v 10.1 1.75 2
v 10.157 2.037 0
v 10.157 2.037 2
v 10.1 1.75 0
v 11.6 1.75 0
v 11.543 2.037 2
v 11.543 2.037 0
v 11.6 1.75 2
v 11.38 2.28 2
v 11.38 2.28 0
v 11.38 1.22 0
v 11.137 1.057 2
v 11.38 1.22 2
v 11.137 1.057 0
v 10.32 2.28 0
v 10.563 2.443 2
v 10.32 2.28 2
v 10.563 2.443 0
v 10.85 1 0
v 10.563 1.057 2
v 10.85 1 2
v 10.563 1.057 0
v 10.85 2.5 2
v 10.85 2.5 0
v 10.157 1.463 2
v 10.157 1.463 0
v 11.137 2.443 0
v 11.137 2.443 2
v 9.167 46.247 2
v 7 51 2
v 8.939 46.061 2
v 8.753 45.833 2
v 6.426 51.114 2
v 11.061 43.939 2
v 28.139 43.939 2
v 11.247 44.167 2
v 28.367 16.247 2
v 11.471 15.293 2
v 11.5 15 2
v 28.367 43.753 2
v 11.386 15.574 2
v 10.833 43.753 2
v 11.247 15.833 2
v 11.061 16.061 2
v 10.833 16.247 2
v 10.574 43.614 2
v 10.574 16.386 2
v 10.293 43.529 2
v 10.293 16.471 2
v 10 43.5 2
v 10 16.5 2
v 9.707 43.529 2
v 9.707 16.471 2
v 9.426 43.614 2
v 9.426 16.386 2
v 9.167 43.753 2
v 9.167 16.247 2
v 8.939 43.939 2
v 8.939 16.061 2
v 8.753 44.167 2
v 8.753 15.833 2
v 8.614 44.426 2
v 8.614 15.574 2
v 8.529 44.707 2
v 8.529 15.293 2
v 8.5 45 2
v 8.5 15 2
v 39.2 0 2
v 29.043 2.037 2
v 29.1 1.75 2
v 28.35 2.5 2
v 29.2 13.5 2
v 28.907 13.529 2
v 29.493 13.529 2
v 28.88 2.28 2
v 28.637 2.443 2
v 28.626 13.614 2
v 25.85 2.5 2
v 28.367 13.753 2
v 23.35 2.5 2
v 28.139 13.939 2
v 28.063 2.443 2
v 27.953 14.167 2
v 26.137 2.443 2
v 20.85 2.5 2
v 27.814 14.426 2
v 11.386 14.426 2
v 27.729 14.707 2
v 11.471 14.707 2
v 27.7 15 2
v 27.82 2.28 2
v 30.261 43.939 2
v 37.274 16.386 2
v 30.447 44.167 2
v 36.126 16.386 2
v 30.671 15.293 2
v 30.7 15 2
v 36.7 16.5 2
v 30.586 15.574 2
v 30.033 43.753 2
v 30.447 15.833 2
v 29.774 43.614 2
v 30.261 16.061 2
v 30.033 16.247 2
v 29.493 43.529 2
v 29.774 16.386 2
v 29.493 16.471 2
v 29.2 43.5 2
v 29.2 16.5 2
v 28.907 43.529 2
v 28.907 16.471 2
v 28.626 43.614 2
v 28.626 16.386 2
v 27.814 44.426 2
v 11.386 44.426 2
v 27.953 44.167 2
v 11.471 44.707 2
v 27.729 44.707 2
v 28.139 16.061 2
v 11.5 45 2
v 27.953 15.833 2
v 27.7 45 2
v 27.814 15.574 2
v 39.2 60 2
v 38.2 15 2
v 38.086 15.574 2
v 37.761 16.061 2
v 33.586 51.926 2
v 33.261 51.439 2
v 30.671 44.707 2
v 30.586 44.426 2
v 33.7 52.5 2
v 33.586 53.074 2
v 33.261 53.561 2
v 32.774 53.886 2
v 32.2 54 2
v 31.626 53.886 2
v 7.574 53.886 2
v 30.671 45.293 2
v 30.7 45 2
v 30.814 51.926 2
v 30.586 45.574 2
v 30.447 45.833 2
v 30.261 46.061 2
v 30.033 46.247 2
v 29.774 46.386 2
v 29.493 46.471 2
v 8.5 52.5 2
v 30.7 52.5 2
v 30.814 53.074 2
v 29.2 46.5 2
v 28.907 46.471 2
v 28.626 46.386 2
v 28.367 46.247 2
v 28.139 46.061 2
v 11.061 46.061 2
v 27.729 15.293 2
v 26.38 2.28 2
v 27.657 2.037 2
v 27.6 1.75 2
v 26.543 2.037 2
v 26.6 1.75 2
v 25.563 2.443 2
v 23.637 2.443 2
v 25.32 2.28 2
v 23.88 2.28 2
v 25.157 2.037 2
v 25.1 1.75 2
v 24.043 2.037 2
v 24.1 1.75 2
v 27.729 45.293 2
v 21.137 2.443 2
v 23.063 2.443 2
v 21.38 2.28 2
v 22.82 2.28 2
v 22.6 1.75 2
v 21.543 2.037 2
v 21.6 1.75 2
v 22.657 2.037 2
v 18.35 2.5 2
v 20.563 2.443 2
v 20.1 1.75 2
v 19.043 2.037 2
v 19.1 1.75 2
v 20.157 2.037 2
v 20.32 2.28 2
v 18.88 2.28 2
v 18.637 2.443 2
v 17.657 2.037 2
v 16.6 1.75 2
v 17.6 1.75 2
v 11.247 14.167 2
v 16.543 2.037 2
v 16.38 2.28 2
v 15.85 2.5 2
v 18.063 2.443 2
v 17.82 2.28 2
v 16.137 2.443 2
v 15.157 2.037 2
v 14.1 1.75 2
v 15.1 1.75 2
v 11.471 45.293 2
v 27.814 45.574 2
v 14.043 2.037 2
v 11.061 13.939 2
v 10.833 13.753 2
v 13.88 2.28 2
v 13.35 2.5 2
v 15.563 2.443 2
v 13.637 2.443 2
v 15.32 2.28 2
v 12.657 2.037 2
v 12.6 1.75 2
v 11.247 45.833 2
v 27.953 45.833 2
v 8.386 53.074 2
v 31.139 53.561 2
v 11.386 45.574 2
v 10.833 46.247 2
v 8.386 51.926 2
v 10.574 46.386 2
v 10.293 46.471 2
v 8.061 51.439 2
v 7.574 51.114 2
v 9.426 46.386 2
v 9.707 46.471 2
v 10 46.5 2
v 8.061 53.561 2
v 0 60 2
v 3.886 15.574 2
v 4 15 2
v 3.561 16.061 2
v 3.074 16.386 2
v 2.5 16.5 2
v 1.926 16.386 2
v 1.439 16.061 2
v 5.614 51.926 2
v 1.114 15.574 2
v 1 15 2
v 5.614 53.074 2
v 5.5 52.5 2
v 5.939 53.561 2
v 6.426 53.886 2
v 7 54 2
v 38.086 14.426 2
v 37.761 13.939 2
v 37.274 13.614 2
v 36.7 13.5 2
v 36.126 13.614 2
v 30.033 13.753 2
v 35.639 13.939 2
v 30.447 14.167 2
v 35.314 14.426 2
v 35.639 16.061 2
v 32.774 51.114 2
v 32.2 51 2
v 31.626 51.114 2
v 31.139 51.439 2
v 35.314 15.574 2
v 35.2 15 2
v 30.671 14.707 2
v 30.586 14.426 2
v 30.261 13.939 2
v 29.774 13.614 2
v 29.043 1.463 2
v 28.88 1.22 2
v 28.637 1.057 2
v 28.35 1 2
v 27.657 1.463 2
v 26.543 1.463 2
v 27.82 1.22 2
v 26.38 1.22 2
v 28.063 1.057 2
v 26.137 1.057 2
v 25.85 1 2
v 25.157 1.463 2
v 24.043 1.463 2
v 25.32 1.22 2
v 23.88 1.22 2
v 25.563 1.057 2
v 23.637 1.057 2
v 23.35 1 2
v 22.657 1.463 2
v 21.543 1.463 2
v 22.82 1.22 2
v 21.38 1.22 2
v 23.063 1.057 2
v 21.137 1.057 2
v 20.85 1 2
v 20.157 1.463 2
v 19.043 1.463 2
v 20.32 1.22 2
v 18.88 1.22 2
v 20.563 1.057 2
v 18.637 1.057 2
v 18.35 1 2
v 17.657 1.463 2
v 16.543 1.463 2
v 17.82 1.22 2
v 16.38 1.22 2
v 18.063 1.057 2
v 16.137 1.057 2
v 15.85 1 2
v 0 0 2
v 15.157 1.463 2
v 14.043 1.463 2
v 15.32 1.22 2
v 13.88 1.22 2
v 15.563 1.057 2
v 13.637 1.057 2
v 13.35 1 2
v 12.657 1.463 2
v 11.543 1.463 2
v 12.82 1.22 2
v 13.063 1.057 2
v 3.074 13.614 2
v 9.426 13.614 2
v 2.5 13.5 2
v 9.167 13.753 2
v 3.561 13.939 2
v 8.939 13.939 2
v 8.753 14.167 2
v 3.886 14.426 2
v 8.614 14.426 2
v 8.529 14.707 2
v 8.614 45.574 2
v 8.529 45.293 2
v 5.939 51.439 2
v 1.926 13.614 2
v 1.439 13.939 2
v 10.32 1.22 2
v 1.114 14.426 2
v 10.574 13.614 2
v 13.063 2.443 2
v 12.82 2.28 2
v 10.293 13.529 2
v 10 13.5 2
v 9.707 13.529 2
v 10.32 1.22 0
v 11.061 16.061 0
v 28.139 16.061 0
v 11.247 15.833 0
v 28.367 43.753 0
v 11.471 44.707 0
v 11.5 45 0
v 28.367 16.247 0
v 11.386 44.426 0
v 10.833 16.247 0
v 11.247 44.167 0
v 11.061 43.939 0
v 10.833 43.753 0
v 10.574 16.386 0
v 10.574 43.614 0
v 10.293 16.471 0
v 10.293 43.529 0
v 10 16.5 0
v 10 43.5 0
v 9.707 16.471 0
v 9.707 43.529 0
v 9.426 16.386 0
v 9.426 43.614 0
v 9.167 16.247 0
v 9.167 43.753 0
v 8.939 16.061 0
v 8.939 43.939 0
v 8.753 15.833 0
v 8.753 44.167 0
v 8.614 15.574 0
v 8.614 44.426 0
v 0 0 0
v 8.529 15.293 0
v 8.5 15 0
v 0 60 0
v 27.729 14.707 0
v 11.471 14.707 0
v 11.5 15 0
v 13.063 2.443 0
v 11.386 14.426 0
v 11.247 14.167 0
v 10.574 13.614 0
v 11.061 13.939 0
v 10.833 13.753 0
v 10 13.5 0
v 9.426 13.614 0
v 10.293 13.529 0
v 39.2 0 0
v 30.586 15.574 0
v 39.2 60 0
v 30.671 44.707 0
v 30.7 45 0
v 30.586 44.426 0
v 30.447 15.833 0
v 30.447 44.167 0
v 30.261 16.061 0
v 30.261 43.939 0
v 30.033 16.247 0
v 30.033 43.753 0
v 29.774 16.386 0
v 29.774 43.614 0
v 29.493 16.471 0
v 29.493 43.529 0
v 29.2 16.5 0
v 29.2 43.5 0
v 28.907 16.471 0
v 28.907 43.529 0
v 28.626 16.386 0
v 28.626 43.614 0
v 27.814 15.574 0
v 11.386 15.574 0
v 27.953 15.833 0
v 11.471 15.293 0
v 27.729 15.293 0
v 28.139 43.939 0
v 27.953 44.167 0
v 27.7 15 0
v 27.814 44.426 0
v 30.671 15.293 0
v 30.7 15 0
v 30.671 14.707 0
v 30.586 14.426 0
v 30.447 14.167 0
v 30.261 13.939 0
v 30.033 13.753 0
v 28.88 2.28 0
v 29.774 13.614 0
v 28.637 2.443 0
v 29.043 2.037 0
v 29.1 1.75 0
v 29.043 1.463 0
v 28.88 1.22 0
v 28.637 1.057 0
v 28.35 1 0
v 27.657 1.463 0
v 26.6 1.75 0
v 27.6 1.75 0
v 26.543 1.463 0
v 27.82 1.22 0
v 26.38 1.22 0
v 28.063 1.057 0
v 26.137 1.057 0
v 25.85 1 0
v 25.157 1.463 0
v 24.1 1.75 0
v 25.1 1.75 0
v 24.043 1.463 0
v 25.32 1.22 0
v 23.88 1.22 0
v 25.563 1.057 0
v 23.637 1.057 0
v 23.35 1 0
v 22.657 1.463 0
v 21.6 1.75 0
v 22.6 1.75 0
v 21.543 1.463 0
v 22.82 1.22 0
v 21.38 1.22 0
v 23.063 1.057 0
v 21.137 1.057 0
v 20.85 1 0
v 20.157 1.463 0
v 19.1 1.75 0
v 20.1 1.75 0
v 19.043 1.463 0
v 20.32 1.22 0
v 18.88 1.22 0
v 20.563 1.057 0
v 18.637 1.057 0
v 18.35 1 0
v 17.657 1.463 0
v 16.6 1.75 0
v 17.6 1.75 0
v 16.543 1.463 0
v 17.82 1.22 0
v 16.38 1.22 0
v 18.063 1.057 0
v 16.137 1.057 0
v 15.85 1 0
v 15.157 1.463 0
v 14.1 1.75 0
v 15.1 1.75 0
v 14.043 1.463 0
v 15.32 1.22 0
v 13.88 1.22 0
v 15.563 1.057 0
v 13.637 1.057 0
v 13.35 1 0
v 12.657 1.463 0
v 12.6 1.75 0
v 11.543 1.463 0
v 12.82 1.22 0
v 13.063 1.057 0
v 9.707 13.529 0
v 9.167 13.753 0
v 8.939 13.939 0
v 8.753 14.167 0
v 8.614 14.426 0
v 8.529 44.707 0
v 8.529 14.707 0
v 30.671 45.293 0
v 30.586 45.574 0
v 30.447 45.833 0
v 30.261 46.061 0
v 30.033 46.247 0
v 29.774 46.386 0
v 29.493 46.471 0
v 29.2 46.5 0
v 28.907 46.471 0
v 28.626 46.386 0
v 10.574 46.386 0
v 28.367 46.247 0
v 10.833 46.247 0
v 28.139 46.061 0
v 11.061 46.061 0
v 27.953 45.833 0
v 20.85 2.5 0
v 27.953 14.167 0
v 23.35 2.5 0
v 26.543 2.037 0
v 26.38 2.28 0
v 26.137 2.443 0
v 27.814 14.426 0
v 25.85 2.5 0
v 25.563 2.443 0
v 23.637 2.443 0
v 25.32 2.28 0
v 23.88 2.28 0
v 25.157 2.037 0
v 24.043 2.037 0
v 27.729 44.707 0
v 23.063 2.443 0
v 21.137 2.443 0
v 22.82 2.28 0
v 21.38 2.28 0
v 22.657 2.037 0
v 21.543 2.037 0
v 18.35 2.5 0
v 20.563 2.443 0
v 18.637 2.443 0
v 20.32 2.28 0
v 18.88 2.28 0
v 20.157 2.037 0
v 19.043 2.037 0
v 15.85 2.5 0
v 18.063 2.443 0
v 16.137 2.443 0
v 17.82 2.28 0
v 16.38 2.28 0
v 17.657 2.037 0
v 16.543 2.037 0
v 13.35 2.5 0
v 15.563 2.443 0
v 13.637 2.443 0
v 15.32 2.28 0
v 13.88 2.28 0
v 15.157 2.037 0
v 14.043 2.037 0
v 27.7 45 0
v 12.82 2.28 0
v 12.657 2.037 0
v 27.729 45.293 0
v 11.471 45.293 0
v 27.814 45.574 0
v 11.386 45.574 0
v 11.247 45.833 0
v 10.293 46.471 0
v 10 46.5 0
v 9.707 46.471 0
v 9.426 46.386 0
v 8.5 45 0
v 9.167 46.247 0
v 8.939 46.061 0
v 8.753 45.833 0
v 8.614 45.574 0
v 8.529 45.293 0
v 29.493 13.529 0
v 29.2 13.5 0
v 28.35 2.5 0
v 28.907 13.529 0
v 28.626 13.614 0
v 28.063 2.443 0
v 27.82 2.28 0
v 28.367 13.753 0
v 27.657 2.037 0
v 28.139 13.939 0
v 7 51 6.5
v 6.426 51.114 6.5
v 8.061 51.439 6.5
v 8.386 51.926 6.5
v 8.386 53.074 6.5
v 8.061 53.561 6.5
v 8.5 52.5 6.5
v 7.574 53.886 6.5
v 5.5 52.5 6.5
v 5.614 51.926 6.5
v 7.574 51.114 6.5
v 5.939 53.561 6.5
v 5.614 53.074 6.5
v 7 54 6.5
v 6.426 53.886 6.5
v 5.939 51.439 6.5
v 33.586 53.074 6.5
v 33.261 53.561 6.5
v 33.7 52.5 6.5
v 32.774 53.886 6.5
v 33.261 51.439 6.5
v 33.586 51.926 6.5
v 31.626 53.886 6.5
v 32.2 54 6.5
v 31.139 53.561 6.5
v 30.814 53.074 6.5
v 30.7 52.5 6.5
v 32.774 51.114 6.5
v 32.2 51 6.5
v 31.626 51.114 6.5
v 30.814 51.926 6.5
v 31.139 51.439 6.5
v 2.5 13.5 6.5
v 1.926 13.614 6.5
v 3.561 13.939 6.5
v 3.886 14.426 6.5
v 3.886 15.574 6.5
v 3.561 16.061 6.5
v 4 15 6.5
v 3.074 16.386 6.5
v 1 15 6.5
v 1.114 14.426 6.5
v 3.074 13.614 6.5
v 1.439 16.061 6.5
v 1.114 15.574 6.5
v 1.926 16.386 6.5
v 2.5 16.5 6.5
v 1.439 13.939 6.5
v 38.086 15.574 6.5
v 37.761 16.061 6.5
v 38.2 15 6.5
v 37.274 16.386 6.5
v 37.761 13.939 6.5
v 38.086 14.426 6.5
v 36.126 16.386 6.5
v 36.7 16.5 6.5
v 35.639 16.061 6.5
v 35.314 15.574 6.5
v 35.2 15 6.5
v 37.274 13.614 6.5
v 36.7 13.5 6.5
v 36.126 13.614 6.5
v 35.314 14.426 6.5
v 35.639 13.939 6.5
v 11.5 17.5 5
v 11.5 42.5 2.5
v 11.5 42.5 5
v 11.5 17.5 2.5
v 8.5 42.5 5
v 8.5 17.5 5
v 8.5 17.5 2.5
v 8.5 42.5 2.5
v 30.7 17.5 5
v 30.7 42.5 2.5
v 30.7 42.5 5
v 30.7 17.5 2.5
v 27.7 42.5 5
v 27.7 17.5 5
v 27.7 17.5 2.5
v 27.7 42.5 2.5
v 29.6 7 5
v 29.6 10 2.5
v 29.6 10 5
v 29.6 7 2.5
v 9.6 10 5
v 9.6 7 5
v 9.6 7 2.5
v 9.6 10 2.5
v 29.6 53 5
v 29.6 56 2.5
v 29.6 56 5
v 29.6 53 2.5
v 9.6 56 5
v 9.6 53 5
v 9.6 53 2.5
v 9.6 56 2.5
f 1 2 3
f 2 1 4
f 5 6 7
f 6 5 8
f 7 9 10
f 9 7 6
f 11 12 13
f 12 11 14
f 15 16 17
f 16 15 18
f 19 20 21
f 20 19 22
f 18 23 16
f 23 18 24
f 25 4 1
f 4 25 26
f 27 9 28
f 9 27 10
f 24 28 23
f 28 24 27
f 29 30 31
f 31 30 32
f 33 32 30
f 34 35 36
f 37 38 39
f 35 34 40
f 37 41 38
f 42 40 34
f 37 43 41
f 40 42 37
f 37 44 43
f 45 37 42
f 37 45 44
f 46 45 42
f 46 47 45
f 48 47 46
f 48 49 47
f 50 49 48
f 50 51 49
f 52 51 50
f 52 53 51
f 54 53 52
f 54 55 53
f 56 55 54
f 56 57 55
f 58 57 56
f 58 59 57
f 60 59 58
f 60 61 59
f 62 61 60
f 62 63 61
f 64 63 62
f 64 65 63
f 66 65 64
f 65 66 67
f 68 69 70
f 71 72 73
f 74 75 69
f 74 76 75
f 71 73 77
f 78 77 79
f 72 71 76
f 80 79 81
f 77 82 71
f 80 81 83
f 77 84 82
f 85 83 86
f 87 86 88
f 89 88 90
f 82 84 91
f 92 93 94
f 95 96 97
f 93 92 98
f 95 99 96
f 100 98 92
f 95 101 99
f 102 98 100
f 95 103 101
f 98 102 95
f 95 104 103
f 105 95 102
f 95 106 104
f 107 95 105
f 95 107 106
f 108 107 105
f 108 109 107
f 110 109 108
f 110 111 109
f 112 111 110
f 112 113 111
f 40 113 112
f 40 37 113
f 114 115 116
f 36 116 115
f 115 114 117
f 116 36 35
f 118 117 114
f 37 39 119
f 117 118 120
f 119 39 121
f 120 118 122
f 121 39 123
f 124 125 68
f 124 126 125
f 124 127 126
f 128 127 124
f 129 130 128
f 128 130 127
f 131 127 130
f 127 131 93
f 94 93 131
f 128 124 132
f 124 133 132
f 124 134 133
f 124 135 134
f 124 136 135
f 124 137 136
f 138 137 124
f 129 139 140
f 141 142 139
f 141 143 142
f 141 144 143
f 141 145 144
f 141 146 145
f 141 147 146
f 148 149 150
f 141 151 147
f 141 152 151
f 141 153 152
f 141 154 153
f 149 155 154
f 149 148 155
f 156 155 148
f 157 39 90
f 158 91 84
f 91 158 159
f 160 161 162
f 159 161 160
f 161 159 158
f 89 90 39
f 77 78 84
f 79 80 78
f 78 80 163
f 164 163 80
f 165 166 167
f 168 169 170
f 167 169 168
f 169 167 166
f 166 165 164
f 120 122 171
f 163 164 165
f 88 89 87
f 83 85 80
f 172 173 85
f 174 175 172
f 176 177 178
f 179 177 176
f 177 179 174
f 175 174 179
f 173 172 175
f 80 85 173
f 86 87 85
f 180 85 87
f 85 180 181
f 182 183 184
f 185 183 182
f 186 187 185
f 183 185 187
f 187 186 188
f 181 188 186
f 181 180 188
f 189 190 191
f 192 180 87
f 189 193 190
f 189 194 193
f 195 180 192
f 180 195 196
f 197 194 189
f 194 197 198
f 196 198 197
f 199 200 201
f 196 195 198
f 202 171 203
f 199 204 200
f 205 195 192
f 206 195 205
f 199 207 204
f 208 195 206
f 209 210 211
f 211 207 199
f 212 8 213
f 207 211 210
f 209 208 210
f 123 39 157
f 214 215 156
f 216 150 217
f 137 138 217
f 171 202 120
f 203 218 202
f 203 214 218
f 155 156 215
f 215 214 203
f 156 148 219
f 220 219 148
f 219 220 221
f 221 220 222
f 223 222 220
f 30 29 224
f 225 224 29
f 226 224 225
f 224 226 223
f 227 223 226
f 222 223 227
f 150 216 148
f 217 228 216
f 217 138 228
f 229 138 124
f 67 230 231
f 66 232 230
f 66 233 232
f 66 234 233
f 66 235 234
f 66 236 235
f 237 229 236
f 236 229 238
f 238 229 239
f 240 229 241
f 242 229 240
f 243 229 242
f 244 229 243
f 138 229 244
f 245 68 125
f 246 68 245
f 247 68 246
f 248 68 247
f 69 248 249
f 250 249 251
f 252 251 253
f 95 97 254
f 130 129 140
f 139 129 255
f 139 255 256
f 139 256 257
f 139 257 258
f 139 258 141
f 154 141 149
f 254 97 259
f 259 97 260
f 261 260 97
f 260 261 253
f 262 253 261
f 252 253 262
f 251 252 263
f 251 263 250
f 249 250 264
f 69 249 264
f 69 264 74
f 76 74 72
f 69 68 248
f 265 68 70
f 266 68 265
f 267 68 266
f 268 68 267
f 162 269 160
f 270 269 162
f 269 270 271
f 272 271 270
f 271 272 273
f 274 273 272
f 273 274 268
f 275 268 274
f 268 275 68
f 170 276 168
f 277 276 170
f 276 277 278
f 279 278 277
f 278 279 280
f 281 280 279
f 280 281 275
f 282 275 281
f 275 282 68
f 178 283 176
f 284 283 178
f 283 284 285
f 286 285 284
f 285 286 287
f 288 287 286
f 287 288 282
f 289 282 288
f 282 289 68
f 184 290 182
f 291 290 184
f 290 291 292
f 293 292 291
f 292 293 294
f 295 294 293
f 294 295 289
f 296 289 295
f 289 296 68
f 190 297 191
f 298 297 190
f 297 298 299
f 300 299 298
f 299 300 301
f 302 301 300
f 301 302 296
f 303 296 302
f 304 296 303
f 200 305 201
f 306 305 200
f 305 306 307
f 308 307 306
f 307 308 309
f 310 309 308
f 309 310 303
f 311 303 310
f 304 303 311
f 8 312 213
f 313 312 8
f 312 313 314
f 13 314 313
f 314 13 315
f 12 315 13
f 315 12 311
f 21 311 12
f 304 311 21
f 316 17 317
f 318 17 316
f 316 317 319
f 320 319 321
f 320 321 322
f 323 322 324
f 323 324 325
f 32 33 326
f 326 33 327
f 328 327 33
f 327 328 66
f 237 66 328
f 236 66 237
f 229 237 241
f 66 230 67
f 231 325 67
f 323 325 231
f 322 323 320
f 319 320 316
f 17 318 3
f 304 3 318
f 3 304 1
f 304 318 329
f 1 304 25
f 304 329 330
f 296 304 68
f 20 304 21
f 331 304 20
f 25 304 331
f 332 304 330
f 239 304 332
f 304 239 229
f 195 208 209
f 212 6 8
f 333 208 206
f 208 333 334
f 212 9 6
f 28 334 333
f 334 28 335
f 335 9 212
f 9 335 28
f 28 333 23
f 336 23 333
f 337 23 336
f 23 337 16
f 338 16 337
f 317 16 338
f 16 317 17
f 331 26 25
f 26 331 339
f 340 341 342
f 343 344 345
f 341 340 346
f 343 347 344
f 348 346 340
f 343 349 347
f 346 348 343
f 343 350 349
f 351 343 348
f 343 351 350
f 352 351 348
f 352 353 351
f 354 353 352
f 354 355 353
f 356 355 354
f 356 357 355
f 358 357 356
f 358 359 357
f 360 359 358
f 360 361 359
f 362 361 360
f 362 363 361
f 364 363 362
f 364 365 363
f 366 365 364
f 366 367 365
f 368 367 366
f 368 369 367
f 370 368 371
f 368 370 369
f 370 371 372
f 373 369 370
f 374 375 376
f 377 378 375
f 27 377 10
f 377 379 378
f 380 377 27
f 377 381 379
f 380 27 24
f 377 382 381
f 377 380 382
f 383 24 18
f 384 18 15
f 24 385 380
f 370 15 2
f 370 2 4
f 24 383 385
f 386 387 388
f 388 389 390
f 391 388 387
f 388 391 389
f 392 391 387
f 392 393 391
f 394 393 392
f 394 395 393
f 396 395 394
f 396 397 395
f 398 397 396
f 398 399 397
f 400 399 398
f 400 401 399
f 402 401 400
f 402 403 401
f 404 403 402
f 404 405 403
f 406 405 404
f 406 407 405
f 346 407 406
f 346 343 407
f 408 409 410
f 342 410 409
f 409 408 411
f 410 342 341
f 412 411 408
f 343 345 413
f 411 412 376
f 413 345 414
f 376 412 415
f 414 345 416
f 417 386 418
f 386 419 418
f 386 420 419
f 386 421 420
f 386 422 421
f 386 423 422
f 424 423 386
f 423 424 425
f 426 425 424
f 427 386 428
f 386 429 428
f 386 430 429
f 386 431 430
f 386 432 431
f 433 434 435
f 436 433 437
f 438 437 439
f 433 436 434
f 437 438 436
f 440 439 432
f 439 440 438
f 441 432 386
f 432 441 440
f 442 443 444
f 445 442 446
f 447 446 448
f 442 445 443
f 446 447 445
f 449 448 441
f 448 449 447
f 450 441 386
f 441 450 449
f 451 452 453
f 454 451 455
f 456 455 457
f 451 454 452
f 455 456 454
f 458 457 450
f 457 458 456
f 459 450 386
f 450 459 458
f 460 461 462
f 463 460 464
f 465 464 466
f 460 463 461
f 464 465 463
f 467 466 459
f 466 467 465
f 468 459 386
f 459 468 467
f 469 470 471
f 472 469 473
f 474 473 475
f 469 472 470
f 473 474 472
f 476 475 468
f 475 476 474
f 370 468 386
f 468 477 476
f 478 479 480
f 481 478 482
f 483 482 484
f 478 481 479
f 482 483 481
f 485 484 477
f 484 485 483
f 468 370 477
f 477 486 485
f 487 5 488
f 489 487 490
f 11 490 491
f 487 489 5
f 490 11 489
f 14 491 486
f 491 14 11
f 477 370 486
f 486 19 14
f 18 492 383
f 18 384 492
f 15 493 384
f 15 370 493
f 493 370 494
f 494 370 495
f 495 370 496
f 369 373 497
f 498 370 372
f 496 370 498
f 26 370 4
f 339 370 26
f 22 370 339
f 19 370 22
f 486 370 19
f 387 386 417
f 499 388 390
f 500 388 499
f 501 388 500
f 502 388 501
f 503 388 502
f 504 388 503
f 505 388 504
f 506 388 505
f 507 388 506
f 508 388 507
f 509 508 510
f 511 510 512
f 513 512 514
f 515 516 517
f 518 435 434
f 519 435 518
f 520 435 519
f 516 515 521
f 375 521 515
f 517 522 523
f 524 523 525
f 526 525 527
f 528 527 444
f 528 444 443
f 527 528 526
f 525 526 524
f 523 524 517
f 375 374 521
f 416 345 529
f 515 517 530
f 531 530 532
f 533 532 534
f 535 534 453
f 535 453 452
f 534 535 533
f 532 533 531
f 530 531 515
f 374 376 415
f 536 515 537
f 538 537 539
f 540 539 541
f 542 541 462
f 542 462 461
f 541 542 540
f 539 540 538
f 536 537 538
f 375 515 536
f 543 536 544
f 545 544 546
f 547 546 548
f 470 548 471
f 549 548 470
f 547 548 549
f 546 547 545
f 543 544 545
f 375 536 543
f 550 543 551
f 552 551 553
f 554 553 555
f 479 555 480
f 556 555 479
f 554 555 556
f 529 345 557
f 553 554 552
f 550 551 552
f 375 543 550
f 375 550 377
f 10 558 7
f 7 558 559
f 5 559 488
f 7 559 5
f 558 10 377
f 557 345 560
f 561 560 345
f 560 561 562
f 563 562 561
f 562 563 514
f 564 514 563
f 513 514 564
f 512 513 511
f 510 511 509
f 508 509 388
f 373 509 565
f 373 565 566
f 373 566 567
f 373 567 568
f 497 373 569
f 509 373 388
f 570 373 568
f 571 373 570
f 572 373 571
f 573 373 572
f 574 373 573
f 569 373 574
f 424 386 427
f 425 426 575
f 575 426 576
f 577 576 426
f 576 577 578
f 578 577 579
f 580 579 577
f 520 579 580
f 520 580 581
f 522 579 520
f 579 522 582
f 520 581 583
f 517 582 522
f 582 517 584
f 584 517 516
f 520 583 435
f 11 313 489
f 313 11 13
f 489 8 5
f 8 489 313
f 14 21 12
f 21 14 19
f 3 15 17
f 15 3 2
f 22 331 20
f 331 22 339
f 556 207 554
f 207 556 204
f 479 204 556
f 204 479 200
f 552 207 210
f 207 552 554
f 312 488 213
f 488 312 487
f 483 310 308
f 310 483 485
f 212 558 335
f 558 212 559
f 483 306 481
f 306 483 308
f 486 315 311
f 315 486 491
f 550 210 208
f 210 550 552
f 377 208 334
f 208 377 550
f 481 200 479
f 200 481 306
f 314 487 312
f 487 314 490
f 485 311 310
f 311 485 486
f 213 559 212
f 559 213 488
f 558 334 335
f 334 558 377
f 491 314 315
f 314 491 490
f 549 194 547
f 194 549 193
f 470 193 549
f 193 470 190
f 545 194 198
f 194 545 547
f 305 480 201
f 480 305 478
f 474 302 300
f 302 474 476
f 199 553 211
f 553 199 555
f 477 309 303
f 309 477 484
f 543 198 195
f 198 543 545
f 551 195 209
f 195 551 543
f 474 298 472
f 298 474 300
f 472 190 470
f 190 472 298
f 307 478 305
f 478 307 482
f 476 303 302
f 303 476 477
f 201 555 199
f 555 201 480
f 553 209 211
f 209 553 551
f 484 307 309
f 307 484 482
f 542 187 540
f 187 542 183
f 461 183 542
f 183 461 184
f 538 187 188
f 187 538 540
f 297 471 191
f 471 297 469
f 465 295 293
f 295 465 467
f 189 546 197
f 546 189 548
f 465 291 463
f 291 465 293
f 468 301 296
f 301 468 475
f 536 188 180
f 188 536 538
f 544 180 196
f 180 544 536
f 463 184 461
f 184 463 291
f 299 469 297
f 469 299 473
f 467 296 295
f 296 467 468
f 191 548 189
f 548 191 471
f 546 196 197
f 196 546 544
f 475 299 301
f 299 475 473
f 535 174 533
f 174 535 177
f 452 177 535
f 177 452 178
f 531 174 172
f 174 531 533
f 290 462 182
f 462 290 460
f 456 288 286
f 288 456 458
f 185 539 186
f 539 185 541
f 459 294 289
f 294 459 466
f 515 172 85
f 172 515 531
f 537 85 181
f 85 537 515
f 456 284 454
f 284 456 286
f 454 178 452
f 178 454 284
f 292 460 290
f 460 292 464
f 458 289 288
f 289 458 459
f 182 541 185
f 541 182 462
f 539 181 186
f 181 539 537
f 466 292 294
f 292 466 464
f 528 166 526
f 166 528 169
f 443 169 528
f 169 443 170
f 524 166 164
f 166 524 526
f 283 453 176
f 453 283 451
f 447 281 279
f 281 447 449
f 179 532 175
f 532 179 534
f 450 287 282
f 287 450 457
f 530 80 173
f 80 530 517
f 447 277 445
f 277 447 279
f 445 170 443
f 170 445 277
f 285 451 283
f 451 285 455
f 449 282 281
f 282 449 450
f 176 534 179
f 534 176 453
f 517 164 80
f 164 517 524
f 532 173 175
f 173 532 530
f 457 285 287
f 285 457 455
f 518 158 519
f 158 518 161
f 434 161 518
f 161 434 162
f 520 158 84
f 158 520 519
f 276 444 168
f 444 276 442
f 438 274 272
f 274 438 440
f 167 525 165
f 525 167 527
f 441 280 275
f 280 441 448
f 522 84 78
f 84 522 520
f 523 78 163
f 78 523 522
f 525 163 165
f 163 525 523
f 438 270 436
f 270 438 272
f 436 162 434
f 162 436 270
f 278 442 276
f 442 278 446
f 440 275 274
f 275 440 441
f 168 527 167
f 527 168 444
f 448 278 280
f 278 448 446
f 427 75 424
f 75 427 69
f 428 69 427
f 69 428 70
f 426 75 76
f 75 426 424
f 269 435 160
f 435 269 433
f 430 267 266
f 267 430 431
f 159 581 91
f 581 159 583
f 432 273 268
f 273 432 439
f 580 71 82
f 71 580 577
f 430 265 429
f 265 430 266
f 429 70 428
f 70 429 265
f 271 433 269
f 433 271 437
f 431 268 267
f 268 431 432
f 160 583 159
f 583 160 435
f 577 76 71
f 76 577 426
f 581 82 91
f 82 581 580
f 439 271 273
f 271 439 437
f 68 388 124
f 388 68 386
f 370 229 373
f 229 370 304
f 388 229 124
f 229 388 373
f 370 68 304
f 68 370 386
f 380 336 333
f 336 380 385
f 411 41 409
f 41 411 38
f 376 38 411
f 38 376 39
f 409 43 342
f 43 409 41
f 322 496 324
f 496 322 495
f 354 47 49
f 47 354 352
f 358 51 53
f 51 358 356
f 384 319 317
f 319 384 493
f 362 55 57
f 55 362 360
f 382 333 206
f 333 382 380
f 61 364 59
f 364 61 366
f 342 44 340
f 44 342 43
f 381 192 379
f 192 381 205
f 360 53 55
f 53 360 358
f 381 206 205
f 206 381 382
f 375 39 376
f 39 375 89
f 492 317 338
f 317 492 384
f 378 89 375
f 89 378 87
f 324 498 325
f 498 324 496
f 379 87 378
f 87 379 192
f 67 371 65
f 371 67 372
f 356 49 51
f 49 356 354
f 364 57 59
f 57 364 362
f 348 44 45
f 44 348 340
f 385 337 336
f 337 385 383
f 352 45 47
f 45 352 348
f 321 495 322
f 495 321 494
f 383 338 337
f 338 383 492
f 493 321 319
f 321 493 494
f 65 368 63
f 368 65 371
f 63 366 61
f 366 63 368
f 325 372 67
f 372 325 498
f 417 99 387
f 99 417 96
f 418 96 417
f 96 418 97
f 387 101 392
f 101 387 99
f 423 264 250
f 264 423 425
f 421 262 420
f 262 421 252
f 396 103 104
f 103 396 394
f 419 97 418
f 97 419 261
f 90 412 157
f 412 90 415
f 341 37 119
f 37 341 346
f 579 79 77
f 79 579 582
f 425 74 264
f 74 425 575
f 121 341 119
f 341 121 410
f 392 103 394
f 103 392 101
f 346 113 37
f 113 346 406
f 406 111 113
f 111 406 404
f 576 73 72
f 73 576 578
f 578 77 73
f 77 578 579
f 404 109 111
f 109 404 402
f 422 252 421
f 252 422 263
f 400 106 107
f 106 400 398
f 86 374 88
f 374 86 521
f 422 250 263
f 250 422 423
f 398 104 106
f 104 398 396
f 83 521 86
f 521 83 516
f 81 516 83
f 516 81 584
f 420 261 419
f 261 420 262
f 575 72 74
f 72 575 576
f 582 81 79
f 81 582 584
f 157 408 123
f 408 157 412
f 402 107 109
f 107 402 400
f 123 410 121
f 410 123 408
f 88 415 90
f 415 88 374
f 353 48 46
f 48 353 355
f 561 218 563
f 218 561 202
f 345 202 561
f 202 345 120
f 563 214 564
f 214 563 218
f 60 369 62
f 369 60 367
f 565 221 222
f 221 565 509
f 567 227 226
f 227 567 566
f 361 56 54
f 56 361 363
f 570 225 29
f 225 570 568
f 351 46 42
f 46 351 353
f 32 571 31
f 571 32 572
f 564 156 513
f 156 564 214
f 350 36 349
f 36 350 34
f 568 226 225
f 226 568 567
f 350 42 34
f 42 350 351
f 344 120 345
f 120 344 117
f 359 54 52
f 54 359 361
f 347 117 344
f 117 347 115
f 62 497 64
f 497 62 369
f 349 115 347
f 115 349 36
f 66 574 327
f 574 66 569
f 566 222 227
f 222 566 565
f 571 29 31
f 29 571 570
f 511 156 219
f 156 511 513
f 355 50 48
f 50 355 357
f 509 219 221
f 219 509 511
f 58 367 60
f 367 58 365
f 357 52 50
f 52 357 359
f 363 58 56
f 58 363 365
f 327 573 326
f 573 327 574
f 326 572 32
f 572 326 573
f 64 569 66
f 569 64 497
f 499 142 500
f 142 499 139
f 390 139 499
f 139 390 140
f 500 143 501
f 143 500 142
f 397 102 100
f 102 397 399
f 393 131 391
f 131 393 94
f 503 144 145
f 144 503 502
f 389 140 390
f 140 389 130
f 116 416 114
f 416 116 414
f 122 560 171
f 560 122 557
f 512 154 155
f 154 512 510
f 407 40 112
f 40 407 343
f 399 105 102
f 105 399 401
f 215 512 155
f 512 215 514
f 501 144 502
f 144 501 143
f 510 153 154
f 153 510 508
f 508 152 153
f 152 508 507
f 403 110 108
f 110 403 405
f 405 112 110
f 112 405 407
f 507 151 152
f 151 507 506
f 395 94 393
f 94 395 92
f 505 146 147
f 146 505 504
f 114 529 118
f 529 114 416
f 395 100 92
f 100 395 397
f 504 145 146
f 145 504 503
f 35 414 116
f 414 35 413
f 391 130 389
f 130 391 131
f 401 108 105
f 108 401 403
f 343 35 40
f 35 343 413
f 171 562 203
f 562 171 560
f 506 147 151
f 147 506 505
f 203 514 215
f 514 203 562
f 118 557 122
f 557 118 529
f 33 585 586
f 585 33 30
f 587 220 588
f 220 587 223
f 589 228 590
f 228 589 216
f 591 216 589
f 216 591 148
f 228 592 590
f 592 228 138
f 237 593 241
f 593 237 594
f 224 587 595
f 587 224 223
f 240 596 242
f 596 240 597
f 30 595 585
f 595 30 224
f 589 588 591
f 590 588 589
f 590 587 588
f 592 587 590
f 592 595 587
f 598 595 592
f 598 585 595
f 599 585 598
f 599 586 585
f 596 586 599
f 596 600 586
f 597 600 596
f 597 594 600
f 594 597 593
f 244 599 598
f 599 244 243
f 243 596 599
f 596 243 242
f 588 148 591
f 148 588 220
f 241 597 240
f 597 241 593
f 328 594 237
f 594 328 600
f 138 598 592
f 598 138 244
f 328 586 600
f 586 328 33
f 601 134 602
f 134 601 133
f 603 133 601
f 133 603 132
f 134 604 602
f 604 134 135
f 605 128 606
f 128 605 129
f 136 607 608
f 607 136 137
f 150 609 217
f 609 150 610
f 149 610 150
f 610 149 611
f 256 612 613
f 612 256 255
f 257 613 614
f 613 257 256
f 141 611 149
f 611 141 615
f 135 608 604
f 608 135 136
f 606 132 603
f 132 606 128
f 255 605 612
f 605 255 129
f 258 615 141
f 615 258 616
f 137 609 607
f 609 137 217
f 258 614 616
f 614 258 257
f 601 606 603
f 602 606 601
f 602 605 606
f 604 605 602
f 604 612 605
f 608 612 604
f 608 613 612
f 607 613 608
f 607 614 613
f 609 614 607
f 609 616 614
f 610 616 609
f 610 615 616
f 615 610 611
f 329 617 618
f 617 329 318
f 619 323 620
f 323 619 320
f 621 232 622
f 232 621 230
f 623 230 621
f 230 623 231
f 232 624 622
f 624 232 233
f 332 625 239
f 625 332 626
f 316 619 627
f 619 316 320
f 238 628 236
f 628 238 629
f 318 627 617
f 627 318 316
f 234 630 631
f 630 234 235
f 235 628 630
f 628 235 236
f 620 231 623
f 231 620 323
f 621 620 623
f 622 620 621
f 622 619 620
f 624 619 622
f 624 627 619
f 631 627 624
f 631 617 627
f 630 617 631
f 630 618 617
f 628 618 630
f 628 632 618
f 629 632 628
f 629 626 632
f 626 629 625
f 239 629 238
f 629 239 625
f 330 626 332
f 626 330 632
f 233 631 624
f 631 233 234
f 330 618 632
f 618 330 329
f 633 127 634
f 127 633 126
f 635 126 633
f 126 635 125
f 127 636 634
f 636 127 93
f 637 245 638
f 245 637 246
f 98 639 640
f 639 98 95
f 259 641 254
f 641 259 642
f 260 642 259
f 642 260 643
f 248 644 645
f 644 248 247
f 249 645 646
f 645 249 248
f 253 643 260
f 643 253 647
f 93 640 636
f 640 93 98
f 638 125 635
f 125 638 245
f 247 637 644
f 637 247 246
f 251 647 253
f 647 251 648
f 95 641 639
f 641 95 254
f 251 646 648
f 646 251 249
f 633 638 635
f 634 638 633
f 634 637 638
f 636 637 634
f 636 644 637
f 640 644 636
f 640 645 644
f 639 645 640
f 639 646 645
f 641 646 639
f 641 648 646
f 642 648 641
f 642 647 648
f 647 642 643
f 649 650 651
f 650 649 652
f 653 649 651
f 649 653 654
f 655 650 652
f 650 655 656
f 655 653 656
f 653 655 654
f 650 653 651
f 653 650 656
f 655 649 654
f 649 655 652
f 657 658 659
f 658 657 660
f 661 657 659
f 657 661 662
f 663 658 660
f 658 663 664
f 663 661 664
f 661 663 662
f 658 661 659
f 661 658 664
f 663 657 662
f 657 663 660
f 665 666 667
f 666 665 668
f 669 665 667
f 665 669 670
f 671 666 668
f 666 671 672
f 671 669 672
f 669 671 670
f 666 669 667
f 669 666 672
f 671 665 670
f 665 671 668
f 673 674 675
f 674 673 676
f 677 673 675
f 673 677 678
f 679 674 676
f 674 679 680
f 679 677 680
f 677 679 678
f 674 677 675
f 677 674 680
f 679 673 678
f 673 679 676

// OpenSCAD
module pin_holes(pins = 8){
    module hole(){
            
            translate([2.5/2, 3.5/2])
            cylinder(
                h=2,
                d=1.5,
                $fn=16
            );
        
    }
    for(x=[0:pins-1]){
        translate([2.5*x+0.5,0,0])
        hole();
    }
}



module rc522_holder(){

// base dimensions
width=39.2;
height=60;
thickness=2;

// pin_spareout
pins_width=21;
pins_height=3;

// holders
holder_diameter = 3;
holder_height = 6.5;
holder_top_offset_x = 7;
holder_top_offset_y = height-7.5;    
holder_bottom_offset_x = 2.5;
holder_bottom_offset_y = 15;    
holder_fn = 16;

difference() {
cube([width,height,thickness]);

translate([(width-pins_width)/2,0,0])
    pin_holes();


translate([10,15,0]) cylinder(h=2,d=3,$fn=32);

translate([width-10,15,0]) cylinder(h=2,d=3,$fn=32);

translate([10,45,0]) cylinder(h=2,d=3,$fn=32);
translate([width-10,45,0]) cylinder(h=2,d=3,$fn=32);

}

// top left
translate([holder_top_offset_x,holder_top_offset_y,0])
    cylinder(h=holder_height, d=holder_diameter, $fn=holder_fn);
// top right
translate([width-holder_top_offset_x,holder_top_offset_y,0])
    cylinder(h=holder_height, d=holder_diameter, $fn=holder_fn);
    

translate([holder_bottom_offset_x,holder_bottom_offset_y,0])
    cylinder(h=holder_height, d=holder_diameter, $fn=holder_fn);

translate([width-holder_bottom_offset_x,holder_bottom_offset_y,0])
//translate([39.2-3.5,14.5,0])
    cylinder(h=holder_height, d=holder_diameter, $fn=holder_fn);
}

translate([8.5, 17.5, 2.5])
cube([3,25,2.5]);
translate([39.2-11.5, 17.5, 2.5])
cube([3,25,2.5]);

translate([(39.2-20)/2, 7, 2.5])
cube([20,3,2.5]);
translate([(39.2-20)/2, 53, 2.5])
cube([20,3,2.5]);


rc522_holder();
